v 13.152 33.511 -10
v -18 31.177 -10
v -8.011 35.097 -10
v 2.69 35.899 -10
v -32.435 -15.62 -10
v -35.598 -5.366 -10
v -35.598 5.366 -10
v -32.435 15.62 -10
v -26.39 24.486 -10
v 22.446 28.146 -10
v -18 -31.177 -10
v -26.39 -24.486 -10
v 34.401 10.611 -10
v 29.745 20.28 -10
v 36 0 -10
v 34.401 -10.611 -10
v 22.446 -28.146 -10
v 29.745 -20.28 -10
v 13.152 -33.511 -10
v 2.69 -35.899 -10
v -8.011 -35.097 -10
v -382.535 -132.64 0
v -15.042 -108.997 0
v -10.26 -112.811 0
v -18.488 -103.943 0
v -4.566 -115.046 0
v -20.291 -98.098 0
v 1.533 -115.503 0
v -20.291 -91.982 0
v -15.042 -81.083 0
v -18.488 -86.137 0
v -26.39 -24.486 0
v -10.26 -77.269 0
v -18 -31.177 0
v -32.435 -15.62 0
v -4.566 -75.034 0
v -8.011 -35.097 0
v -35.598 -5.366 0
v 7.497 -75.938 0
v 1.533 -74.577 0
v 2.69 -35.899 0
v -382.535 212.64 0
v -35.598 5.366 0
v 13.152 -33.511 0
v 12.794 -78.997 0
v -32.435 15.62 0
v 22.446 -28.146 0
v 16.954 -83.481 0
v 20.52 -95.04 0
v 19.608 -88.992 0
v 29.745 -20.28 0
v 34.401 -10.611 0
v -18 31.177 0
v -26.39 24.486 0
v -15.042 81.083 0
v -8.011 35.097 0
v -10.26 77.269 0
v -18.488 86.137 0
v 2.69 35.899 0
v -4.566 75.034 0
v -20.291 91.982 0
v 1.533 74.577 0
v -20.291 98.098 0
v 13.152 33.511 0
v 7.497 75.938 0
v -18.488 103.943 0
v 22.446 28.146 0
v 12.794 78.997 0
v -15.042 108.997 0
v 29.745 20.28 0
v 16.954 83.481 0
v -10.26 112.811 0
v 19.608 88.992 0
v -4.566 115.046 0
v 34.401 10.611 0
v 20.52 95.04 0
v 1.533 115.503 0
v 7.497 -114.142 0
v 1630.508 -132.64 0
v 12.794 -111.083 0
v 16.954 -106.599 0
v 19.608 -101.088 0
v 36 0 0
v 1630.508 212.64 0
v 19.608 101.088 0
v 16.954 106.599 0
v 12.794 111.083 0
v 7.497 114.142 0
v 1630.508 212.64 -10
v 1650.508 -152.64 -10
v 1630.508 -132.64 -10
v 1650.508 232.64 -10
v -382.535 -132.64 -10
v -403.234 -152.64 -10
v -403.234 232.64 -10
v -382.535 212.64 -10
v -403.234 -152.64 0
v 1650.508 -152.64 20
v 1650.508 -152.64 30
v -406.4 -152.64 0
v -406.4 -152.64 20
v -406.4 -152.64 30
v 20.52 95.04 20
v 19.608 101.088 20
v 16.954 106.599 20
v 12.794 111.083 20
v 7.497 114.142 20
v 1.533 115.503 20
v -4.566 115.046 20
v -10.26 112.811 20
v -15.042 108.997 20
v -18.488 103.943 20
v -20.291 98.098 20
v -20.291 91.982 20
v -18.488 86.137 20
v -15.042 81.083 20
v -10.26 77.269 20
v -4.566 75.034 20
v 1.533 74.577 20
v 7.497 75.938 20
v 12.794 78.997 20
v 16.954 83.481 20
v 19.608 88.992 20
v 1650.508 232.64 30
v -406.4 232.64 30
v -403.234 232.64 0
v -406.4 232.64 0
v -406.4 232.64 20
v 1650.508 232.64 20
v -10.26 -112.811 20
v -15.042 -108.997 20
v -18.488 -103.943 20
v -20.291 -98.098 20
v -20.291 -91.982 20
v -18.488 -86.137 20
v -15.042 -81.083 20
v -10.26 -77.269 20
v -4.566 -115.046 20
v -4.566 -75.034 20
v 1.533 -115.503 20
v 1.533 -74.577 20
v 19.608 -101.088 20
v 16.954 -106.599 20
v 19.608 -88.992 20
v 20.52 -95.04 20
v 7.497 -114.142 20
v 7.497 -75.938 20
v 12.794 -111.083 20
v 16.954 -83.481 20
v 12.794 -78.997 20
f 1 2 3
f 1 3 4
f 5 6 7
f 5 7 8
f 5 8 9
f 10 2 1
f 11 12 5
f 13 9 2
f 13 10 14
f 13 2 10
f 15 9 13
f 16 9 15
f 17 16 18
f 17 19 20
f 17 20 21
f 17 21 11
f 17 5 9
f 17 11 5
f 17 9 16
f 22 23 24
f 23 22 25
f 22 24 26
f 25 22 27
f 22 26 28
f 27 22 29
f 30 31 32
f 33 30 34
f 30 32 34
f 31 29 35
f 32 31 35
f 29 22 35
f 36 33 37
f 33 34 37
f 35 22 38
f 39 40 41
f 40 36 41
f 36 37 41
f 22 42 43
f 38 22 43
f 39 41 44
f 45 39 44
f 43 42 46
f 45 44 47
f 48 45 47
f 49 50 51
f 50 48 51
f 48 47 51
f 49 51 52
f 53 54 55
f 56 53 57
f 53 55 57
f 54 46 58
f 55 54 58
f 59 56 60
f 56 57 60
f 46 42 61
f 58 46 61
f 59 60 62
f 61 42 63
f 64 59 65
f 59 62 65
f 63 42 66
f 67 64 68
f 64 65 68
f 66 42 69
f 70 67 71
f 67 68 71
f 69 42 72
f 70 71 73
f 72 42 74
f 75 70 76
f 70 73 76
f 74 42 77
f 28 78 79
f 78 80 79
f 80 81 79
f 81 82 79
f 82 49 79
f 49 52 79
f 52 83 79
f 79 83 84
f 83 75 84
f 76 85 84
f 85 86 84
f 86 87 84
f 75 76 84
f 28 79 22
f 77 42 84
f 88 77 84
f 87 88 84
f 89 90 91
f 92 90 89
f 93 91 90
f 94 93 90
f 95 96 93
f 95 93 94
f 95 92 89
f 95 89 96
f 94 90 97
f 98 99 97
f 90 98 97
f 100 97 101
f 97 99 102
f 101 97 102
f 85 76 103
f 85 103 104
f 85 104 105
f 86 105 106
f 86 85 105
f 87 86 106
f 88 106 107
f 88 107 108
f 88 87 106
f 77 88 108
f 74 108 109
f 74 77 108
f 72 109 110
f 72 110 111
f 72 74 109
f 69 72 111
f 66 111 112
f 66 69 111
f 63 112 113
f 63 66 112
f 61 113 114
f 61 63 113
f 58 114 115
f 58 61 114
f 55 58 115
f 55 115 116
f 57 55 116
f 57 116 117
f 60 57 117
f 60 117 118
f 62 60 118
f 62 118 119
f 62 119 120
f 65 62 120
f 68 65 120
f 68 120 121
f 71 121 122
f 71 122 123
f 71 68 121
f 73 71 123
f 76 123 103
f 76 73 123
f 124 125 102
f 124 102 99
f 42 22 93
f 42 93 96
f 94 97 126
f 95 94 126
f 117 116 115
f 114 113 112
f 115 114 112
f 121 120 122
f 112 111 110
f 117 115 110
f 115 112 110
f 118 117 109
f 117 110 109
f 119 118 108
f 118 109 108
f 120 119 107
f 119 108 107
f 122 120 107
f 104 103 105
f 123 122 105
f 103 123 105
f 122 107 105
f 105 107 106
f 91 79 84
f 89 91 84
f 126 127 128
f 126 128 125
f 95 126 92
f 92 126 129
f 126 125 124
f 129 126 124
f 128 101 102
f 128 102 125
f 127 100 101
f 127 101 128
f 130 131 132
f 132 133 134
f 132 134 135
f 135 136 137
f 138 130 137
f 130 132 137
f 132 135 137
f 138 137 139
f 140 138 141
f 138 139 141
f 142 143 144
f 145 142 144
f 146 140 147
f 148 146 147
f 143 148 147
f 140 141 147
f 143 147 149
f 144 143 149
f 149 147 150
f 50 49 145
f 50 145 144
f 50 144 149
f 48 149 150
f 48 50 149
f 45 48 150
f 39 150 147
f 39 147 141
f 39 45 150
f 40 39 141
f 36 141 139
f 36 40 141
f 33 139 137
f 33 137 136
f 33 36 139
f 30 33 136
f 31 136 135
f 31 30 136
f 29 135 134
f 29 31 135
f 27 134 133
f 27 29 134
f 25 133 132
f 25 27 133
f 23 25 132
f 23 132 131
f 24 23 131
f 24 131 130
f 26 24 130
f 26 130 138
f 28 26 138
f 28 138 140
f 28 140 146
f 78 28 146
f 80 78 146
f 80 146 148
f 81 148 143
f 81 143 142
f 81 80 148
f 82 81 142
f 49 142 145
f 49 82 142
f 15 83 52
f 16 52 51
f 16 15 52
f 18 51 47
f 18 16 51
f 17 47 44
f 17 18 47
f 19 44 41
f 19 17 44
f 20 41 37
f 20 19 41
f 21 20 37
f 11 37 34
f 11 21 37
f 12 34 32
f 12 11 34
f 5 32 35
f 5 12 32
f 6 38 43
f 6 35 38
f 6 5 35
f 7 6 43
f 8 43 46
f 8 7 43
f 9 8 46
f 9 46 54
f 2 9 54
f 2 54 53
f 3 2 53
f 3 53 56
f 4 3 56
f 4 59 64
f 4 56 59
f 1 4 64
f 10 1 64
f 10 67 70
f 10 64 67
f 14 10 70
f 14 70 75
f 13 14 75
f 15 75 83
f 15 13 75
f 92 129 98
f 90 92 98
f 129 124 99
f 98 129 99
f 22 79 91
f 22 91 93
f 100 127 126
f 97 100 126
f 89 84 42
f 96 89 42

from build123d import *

# Parameters (mm, degrees)
SKETCH1_R           = 36
SKETCH1_R_2         = 20.52
BOSS_EXTRUDE1_DEPTH = 20
SKETCH2_W           = 2056.908092605
SKETCH2_H           = 385.28
BOSS_EXTRUDE2_DEPTH = 10
BOSS_EXTRUDE3_START = 30
SKETCH3_R           = 36
BOSS_EXTRUDE3_DEPTH = 30
SKETCH4_W           = 2013.042913478
SKETCH4_H           = 345.28
BOSS_EXTRUDE4_DEPTH = 10


with BuildPart() as part:
    # Sketch1 → Boss-Extrude1 (new body)
    with BuildSketch(Plane.XY):
        Polygon((-406.4, -152.64), (406.4, -152.64), (1650.508092605, -152.64), (1650.508092605, 232.64), (-406.4, 232.64), (-406.4, 152.64), align=None)
        Circle(SKETCH1_R, mode=Mode.SUBTRACT)
        with Locations((0, 95.04)):
            Circle(SKETCH1_R_2, mode=Mode.SUBTRACT)
        with Locations((0, -95.04)):
            Circle(SKETCH1_R_2, mode=Mode.SUBTRACT)
    extrude(amount=BOSS_EXTRUDE1_DEPTH)

    # Sketch2 → Boss-Extrude2 (add)
    with BuildSketch(Plane.XY.offset(20)):
        with Locations((622.054046302, 40)):
            Rectangle(SKETCH2_W, SKETCH2_H)
    extrude(amount=BOSS_EXTRUDE2_DEPTH)

    # Sketch3 → Boss-Extrude3 (add)
    with BuildSketch(Plane(origin=(0, 0, 20), x_dir=(-1, 0, 0), z_dir=(0, 0, -1)).offset(BOSS_EXTRUDE3_START)):
        with Locations(Location((0, 0, 0), (0, 0, 180))):
            Circle(SKETCH3_R)
    extrude(amount=-BOSS_EXTRUDE3_DEPTH)

    # Sketch4 → Boss-Extrude4 (add)
    with BuildSketch(Plane(origin=(0, 0, 0), x_dir=(-1, 0, 0), z_dir=(0, 0, -1))):
        Polygon((-1630.508092605, 232.64), (-1650.508092605, 232.64), (-1650.508092605, -152.64), (403.233696812, -152.64), (403.233696812, 232.64), align=None)
        with Locations((-623.986635866, 40)):
            Rectangle(SKETCH4_W, SKETCH4_H, mode=Mode.SUBTRACT)
    extrude(amount=BOSS_EXTRUDE4_DEPTH)


solid = part.part
